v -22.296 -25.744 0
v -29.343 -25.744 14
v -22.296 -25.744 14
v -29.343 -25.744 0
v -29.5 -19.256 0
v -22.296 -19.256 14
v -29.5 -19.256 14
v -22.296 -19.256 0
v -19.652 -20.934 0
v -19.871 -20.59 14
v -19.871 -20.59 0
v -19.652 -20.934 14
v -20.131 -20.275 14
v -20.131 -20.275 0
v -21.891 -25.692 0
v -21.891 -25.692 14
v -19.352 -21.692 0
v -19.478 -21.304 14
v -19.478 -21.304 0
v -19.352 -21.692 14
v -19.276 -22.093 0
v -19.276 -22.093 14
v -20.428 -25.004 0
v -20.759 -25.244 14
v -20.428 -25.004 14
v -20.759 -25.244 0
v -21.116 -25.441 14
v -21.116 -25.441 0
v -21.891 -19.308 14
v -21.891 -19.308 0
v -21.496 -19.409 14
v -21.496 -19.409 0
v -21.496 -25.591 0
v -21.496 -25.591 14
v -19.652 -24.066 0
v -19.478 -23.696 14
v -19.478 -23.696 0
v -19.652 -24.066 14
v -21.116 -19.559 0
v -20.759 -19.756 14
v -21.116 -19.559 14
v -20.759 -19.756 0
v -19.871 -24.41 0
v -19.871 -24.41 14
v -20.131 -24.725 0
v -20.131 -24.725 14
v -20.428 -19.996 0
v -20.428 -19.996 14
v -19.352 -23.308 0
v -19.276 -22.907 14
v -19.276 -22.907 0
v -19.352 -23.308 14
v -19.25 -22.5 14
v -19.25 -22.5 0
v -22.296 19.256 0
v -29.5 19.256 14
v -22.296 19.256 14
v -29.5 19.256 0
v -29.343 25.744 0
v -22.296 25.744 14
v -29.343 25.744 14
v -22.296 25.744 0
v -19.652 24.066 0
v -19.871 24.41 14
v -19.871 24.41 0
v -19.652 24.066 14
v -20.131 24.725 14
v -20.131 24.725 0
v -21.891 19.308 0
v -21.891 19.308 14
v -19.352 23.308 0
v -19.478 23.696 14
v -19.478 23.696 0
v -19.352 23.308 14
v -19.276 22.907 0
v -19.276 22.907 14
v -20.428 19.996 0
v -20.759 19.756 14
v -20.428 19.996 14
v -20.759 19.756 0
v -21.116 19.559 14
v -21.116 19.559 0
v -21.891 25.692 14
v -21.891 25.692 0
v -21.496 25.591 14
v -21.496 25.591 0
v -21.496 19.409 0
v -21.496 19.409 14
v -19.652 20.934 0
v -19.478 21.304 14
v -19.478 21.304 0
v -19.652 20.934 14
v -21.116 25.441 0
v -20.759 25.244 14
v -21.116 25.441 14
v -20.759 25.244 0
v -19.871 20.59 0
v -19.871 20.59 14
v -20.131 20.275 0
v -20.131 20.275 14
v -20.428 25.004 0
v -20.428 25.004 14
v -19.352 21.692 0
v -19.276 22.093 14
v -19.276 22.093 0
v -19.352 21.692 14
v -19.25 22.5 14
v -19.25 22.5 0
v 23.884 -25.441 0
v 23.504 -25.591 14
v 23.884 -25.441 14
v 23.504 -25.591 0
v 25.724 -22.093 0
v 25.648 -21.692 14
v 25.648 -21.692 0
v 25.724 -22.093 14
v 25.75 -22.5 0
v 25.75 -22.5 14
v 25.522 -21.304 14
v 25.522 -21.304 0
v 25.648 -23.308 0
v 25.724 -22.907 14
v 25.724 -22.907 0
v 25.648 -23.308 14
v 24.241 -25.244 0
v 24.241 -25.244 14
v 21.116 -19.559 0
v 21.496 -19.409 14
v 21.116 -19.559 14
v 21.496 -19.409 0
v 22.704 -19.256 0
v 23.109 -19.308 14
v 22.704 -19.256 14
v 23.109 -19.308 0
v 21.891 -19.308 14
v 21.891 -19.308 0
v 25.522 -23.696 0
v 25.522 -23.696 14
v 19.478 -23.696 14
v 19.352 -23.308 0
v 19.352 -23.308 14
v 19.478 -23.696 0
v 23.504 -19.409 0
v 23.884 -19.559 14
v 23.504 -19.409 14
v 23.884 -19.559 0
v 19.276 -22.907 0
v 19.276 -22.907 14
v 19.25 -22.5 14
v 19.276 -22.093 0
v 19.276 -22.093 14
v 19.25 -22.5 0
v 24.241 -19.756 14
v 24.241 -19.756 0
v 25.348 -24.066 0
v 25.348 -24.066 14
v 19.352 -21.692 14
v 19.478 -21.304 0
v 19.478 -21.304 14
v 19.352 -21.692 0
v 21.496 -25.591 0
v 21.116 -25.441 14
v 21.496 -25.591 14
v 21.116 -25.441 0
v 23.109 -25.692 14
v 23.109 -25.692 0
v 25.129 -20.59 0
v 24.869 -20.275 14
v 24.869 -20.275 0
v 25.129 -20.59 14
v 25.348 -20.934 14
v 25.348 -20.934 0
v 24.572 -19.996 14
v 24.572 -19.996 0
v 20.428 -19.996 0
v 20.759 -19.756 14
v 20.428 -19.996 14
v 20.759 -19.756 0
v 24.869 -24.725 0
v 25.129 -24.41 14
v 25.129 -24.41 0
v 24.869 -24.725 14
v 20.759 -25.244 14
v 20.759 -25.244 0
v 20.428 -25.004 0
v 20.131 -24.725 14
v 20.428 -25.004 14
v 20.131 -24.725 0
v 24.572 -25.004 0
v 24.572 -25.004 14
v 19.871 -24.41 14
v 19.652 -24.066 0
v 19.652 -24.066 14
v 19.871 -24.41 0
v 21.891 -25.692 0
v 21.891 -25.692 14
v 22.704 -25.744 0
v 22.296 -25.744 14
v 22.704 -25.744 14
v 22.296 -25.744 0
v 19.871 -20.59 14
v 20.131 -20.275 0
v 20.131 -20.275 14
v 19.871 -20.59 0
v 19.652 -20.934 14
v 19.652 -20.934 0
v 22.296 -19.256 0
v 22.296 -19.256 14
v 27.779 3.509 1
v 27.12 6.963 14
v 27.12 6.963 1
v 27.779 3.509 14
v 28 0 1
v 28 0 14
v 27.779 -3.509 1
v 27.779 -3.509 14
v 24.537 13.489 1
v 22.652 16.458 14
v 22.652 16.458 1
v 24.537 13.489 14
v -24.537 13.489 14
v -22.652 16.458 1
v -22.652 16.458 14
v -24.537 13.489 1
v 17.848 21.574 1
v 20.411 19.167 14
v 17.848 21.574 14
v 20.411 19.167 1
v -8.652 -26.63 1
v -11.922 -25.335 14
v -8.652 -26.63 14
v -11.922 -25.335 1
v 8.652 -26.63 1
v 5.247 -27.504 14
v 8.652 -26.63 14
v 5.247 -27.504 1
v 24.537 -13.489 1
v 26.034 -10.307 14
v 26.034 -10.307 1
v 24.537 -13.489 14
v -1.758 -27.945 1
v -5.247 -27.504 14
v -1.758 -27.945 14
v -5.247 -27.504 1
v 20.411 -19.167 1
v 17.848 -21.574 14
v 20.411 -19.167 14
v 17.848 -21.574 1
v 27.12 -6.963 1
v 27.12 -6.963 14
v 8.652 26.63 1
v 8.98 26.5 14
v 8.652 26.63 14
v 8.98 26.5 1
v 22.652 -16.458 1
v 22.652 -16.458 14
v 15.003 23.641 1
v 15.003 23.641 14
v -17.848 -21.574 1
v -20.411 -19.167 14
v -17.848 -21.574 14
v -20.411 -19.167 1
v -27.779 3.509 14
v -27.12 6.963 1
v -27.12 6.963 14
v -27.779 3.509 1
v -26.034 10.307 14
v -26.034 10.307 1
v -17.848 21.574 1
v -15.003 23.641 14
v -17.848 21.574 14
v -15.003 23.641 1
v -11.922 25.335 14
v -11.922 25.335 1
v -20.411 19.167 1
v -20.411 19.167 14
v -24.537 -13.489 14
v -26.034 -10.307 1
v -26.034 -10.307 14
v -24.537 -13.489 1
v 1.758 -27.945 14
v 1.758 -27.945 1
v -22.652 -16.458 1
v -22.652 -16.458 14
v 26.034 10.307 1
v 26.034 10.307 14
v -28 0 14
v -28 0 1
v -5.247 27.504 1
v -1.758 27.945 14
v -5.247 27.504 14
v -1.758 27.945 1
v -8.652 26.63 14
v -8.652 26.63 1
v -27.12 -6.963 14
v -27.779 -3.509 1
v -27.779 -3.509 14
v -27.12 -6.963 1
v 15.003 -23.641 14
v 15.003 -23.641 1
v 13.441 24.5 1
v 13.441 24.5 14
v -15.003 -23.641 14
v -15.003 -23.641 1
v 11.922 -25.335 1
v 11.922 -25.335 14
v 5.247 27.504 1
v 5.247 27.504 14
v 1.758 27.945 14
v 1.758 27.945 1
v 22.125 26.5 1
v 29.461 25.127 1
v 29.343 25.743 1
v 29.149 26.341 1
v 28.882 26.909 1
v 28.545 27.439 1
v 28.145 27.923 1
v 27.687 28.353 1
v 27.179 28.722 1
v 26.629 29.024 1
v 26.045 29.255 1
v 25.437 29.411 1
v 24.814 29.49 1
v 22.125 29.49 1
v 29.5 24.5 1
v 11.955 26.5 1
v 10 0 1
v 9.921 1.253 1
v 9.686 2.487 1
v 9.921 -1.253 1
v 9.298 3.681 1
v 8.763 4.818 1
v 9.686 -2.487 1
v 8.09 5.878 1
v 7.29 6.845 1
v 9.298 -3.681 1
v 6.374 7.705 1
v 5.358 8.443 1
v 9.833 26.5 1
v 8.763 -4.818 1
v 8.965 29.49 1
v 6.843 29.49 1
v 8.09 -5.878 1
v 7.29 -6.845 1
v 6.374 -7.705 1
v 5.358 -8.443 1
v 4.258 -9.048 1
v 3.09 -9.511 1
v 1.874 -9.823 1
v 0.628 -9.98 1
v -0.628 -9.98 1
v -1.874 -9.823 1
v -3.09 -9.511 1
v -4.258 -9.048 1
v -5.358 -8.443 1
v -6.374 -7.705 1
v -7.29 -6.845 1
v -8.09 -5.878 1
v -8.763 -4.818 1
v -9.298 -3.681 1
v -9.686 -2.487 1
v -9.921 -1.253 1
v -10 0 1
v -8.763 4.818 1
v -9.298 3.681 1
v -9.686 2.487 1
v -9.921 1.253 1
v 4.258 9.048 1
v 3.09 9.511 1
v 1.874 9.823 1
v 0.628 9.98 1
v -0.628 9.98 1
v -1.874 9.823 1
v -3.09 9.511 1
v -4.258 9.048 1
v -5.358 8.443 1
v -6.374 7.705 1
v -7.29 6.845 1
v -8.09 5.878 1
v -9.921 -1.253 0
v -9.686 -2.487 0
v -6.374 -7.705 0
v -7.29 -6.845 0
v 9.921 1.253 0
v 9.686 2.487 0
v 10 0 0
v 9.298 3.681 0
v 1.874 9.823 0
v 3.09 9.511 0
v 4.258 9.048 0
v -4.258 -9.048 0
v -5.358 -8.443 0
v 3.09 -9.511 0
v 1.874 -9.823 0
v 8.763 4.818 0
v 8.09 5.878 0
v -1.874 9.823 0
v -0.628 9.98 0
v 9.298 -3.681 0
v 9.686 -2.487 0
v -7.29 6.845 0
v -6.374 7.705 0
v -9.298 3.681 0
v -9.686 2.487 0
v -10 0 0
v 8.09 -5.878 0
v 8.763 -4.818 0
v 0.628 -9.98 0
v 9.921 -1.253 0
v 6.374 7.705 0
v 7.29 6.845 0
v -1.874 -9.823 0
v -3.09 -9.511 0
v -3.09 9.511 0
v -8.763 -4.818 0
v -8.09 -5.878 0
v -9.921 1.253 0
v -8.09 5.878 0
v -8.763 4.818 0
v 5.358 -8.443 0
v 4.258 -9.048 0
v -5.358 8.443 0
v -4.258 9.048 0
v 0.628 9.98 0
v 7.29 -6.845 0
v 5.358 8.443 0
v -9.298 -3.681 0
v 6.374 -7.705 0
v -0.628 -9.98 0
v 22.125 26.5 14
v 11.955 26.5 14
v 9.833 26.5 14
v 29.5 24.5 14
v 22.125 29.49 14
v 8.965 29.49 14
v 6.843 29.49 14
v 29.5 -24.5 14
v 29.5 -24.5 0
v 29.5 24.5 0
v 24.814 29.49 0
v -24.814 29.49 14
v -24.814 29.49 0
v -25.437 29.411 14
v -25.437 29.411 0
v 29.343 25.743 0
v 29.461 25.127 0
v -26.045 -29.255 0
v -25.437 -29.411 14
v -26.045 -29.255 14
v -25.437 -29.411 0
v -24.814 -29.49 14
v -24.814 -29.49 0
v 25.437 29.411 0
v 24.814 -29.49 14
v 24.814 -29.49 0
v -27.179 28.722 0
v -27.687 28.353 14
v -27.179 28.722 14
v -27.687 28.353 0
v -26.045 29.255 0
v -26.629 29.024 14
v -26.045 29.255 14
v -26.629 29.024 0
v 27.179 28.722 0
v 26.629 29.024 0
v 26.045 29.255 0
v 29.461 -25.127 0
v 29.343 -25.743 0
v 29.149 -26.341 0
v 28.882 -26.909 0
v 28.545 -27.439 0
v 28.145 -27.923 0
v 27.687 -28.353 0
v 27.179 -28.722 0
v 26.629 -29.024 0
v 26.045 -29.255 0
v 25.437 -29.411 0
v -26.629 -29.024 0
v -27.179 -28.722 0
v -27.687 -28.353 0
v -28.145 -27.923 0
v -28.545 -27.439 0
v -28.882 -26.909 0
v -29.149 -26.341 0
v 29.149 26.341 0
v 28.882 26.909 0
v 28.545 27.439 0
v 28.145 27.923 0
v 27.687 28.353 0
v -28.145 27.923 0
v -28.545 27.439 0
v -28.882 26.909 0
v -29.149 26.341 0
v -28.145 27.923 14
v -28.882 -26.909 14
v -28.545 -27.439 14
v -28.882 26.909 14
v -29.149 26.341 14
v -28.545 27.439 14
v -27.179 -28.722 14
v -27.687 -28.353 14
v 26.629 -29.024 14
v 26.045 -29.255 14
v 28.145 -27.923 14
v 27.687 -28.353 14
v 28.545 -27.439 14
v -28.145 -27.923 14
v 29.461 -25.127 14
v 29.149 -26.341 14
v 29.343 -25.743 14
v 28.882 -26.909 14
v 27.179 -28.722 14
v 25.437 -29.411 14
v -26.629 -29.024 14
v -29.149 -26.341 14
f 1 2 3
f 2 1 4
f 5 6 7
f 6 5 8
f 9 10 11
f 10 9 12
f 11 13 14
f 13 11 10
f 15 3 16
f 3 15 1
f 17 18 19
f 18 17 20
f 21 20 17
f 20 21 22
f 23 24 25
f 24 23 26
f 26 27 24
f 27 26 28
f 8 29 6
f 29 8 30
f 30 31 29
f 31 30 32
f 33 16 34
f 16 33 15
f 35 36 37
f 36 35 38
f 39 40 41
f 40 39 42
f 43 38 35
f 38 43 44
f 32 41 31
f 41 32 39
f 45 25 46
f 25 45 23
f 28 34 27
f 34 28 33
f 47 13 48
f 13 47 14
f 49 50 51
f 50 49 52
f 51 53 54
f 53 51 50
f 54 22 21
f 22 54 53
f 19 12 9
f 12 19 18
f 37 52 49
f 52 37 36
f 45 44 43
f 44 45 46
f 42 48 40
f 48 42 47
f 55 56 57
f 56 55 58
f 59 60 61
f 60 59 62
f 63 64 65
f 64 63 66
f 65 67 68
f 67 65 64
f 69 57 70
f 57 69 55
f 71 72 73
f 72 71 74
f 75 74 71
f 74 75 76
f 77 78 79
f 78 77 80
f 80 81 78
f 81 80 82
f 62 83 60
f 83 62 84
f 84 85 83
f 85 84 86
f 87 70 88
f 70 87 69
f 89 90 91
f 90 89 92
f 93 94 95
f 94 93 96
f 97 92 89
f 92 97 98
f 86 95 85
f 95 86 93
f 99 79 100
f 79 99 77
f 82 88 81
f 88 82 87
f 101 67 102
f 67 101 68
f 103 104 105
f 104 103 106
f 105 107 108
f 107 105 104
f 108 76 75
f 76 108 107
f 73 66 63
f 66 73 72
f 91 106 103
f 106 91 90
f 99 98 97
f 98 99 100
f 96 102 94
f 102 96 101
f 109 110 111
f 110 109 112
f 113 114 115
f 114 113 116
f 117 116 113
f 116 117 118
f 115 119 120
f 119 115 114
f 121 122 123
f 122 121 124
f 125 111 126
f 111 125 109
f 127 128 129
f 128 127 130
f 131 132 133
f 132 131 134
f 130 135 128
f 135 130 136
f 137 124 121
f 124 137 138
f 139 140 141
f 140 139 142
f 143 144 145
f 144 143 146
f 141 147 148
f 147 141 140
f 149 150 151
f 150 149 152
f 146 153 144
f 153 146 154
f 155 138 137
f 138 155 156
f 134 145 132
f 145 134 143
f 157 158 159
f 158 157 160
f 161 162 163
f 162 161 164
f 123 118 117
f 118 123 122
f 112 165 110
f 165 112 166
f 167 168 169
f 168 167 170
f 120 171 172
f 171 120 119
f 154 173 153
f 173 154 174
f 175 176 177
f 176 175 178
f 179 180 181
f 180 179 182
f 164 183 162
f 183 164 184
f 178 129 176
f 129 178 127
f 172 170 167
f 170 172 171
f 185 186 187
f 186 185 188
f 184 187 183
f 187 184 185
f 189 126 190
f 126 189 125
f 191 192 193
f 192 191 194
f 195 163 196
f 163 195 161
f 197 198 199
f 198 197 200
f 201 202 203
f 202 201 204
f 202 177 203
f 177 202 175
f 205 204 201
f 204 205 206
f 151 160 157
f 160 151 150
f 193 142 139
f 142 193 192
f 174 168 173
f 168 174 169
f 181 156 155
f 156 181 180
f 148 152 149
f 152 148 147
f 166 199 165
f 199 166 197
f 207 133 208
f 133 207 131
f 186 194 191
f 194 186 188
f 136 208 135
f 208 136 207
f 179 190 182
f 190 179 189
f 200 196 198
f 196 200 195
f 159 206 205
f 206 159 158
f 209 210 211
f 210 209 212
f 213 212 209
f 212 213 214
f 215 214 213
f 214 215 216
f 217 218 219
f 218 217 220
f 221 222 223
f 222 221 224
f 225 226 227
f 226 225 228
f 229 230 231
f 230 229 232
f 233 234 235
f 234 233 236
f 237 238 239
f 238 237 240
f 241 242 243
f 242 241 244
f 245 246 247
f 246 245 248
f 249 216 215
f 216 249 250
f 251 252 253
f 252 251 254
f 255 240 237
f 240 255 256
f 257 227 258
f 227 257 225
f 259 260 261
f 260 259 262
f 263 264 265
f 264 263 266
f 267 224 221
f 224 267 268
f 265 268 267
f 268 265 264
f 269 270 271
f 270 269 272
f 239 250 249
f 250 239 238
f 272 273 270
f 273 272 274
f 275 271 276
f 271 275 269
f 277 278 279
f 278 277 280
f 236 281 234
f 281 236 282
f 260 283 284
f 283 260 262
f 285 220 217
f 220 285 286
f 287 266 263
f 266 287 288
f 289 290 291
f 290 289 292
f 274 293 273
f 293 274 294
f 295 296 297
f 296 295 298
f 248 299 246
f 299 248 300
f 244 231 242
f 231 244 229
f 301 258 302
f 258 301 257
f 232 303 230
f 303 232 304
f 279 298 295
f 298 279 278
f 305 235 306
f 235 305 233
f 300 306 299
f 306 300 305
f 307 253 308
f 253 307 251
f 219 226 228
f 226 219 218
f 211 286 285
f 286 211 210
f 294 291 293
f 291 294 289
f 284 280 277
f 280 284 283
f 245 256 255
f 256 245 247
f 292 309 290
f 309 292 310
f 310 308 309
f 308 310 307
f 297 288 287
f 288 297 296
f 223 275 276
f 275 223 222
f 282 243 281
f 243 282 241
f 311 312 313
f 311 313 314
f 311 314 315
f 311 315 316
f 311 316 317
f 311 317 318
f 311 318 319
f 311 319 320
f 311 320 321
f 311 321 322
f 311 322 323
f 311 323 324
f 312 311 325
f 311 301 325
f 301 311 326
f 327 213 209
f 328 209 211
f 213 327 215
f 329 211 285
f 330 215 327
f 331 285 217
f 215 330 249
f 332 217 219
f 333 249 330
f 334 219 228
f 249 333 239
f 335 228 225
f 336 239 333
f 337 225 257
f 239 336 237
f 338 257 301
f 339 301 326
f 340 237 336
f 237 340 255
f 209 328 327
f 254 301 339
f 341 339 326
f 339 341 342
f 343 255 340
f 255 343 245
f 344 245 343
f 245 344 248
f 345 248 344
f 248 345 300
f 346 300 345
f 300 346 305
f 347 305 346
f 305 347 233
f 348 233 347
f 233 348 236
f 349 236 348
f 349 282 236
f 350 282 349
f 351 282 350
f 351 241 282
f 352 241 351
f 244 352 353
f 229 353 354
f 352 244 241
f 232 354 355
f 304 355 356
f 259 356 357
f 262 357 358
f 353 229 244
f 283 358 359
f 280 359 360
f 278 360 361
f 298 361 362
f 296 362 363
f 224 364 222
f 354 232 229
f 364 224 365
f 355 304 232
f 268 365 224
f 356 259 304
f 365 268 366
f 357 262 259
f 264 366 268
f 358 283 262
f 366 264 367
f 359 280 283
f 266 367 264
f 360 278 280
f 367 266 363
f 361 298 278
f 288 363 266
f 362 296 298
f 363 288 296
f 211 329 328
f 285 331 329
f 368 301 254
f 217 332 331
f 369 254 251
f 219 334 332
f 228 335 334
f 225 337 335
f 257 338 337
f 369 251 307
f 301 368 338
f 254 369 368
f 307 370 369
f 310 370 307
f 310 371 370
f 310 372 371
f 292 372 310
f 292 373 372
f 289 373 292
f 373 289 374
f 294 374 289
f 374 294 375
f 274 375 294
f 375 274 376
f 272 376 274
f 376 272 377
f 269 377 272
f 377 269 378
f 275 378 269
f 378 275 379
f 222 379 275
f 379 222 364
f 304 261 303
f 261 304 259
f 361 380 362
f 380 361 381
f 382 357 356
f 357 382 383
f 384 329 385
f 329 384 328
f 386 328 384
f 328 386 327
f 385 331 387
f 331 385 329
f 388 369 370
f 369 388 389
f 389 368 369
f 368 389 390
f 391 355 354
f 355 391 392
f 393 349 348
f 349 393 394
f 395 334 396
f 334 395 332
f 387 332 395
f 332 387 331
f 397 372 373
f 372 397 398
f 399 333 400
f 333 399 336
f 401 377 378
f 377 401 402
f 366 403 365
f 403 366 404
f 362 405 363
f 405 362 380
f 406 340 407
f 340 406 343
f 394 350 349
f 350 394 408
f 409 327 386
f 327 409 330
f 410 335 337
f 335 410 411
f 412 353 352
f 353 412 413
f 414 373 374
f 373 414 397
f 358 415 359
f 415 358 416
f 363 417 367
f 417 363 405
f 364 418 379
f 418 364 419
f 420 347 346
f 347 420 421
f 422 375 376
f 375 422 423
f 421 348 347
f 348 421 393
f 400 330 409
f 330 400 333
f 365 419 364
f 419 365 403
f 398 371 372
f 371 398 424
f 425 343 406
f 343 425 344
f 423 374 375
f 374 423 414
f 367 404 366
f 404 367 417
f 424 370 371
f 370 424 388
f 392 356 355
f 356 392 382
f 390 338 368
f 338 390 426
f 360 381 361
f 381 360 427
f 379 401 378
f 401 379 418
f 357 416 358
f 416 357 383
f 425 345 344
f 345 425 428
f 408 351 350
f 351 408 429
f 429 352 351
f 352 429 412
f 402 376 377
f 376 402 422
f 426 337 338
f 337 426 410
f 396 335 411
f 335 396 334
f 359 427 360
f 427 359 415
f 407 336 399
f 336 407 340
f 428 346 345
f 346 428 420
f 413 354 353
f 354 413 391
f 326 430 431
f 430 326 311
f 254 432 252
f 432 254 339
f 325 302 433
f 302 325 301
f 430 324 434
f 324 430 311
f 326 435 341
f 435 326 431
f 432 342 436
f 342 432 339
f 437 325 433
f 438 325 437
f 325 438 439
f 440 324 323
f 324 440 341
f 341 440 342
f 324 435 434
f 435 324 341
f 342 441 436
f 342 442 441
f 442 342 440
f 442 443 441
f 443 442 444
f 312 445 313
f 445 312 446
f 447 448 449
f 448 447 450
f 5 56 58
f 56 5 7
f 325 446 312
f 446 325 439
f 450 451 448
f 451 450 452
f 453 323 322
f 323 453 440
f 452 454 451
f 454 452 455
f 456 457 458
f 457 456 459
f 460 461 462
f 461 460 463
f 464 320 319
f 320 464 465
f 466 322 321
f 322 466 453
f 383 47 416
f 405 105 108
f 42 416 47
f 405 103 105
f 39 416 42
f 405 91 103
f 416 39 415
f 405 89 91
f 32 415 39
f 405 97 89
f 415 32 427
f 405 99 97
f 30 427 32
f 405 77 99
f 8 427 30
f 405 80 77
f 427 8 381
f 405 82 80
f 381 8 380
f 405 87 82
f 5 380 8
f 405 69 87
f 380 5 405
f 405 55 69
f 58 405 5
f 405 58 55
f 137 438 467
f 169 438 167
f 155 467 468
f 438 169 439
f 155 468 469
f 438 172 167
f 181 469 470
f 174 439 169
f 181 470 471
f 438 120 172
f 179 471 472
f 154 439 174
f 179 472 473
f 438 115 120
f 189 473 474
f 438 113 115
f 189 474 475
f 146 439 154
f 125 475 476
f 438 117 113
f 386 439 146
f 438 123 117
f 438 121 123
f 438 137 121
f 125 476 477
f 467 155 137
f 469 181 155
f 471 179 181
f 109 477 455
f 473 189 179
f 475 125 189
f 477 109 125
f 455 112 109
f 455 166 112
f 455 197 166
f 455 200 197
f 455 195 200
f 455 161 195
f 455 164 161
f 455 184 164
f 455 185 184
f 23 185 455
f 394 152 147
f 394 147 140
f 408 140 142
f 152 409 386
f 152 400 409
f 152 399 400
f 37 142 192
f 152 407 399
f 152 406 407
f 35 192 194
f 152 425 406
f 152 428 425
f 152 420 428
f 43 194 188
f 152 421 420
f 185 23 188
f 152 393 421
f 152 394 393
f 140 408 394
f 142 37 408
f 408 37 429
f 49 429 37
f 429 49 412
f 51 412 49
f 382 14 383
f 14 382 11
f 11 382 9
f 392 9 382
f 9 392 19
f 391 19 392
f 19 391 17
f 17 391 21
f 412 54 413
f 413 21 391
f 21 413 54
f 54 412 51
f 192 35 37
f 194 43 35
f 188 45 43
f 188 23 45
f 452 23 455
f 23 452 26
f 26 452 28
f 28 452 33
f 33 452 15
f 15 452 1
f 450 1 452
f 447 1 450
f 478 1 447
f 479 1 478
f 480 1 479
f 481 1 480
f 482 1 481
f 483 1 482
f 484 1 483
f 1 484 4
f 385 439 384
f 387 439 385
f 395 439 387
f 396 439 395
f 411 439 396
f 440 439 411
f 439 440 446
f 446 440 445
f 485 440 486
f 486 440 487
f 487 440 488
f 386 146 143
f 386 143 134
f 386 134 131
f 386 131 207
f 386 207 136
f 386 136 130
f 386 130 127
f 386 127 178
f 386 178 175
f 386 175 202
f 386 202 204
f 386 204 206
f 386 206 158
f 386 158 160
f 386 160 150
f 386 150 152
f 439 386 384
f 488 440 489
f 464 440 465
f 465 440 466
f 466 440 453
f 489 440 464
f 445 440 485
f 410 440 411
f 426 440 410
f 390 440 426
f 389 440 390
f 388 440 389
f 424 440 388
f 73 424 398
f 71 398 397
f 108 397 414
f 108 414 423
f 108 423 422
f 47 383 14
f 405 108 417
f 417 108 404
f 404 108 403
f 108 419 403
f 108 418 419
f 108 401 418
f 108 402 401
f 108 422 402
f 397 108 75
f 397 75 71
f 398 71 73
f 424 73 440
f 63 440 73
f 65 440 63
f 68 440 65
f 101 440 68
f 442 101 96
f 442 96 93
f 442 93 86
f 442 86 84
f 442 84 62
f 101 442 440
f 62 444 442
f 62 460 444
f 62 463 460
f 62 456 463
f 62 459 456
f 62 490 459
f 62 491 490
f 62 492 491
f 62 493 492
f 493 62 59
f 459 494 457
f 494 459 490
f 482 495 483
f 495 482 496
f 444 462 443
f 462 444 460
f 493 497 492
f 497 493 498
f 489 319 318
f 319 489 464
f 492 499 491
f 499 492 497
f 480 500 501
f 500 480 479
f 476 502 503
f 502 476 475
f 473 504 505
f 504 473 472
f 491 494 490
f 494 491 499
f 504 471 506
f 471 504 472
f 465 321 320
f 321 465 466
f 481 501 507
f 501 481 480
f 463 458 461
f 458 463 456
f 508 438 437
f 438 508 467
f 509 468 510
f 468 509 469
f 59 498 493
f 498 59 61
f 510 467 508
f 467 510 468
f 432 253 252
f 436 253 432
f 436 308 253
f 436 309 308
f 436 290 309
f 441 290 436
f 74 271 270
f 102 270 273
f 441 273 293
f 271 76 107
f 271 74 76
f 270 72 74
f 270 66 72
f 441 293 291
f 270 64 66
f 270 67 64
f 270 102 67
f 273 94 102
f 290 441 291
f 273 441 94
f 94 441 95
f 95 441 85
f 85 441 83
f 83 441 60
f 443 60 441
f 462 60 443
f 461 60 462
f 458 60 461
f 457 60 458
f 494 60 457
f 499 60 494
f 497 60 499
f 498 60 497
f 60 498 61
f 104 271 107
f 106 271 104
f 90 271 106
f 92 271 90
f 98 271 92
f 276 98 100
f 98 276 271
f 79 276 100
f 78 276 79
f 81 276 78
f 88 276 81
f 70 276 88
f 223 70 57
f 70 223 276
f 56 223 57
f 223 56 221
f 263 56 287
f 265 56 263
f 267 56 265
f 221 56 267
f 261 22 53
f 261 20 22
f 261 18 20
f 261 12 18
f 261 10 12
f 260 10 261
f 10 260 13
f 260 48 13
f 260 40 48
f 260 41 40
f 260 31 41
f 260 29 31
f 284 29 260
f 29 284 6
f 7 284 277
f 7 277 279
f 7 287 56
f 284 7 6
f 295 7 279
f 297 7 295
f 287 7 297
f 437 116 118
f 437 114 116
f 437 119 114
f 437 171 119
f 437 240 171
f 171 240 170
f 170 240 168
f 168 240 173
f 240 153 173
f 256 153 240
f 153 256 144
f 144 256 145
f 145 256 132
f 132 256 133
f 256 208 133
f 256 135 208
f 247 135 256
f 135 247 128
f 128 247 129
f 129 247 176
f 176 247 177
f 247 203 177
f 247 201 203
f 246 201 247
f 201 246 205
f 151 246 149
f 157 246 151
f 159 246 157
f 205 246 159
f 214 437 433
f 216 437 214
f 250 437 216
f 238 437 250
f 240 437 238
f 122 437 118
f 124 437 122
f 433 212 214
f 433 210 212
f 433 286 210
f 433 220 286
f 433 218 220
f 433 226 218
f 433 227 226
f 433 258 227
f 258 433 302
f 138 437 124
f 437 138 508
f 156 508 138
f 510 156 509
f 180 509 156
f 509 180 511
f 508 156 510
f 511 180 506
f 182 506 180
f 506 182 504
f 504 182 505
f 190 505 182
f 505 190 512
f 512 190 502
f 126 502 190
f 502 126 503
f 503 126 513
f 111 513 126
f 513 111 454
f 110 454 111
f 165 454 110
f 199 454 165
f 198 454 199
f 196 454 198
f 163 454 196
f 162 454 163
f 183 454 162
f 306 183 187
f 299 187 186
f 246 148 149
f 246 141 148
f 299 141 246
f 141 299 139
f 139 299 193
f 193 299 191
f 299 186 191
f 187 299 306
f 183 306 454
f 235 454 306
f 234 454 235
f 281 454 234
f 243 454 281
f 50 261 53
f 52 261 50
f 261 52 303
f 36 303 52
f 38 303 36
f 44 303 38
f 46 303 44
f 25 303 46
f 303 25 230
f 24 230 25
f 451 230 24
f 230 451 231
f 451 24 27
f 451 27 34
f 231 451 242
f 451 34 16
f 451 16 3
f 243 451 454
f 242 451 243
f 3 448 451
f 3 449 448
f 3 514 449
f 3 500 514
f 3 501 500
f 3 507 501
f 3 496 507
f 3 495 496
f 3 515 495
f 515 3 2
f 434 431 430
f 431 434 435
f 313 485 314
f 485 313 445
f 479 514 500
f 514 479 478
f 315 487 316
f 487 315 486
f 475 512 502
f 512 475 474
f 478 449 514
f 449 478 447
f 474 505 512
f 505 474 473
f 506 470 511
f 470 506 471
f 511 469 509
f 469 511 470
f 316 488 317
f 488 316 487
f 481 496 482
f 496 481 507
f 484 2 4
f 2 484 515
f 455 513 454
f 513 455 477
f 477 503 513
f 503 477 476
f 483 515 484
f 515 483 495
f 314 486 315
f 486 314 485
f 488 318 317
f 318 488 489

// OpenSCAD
$fn = 50;


difference() {
	union() {
		translate(v = [0, 0, 0]) {
			rotate(a = [0, 0, 0]) {
				hull() {
					translate(v = [-24.5000000000, 24.5000000000, 0]) {
						rotate(a = [0, 0, 0]) {
							translate(v = [0, 0, 0]) {
								rotate(a = [0, 0, 0]) {
									cylinder(h = 14, r = 5);
								}
							}
						}
					}
					translate(v = [24.5000000000, 24.5000000000, 0]) {
						rotate(a = [0, 0, 0]) {
							translate(v = [0, 0, 0]) {
								rotate(a = [0, 0, 0]) {
									cylinder(h = 14, r = 5);
								}
							}
						}
					}
					translate(v = [-24.5000000000, -24.5000000000, 0]) {
						rotate(a = [0, 0, 0]) {
							translate(v = [0, 0, 0]) {
								rotate(a = [0, 0, 0]) {
									cylinder(h = 14, r = 5);
								}
							}
						}
					}
					translate(v = [24.5000000000, -24.5000000000, 0]) {
						rotate(a = [0, 0, 0]) {
							translate(v = [0, 0, 0]) {
								rotate(a = [0, 0, 0]) {
									cylinder(h = 14, r = 5);
								}
							}
						}
					}
				}
			}
		}
	}
	union() {
		translate(v = [-30.0000000000, -22.5000000000, -125]) {
			rotate(a = [0, 0, 0]) {
				hull() {
					translate(v = [7.5000000000, 0, 0]) {
						rotate(a = [0, 0, 0]) {
							translate(v = [0, 0, 0]) {
								rotate(a = [0, 0, 0]) {
									cylinder(h = 250, r = 3.2500000000);
								}
							}
						}
					}
					translate(v = [-7.5000000000, 0, 0]) {
						rotate(a = [0, 0, 0]) {
							translate(v = [0, 0, 0]) {
								rotate(a = [0, 0, 0]) {
									cylinder(h = 250, r = 3.2500000000);
								}
							}
						}
					}
				}
			}
		}
		translate(v = [-30.0000000000, 22.5000000000, -125]) {
			rotate(a = [0, 0, 0]) {
				hull() {
					translate(v = [7.5000000000, 0, 0]) {
						rotate(a = [0, 0, 0]) {
							translate(v = [0, 0, 0]) {
								rotate(a = [0, 0, 0]) {
									cylinder(h = 250, r = 3.2500000000);
								}
							}
						}
					}
					translate(v = [-7.5000000000, 0, 0]) {
						rotate(a = [0, 0, 0]) {
							translate(v = [0, 0, 0]) {
								rotate(a = [0, 0, 0]) {
									cylinder(h = 250, r = 3.2500000000);
								}
							}
						}
					}
				}
			}
		}
		translate(v = [22.5000000000, -22.5000000000, -125.0000000000]) {
			rotate(a = [0, 0, 0]) {
				cylinder(h = 250, r = 3.2500000000);
			}
		}
		translate(v = [0, 0, 1.0000000000]) {
			rotate(a = [0, 0, 0]) {
				cylinder(h = 16, r = 28.0000000000);
			}
		}
		translate(v = [0, 0, -7.0000000000]) {
			rotate(a = [0, 0, 0]) {
				cylinder(h = 14, r = 10.0000000000);
			}
		}
		translate(v = [0.0000000000, 24.5000000000, 1]) {
			rotate(a = [0, 0, 0]) {
				cube(size = [29.5000000000, 2, 16]);
			}
		}
		translate(v = [22.1250000000, 24.5000000000, 1]) {
			rotate(a = [0, 0, 0]) {
				cube(size = [7.3750000000, 5, 16]);
			}
		}
		translate(v = [6.0833333333, 30.2500000000, 1]) {
			rotate(a = [0, 0, -45]) {
				cube(size = [7.5000000000, 1.5000000000, 16]);
			}
		}
	}
}
